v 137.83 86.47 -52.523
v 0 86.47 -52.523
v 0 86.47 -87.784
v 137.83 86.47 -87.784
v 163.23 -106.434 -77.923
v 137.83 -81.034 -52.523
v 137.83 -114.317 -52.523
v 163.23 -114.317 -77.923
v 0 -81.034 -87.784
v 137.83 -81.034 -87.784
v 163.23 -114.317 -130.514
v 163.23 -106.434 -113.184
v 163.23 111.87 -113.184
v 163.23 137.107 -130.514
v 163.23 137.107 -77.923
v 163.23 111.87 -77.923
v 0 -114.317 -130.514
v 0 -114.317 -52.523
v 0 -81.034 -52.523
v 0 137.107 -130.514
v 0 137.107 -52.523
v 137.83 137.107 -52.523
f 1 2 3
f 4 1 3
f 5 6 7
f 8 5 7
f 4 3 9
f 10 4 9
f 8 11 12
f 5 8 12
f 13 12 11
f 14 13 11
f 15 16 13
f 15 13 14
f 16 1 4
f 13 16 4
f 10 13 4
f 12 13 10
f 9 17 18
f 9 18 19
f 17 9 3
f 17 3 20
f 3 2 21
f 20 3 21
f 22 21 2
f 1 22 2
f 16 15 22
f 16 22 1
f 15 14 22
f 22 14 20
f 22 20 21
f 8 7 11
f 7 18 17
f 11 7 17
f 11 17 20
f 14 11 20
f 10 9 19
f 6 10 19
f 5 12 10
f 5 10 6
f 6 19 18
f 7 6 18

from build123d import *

# Parameters (mm, degrees)
F1_DEPTH = 163.230464
F2_SIZE  = 25.4


with BuildPart() as f1:
    # F0 (on Right) → F1 (new body)
    with BuildSketch(Plane.YZ):
        Polygon((-81.034228, -87.784111), (-81.034228, -52.52336), (-114.317387, -52.52336), (-114.317387, -130.513579), (137.106746, -130.513579), (137.106746, -52.52336), (86.470395, -52.52336), (86.470395, -87.784111), align=None)
    extrude(amount=F1_DEPTH)

    # F2
    f2_edges = [f1.edges().sort_by_distance(p)[0] for p in [
        (163.230464, 2.718084, -87.784111),
        (163.230464, -81.034228, -70.153736),
        (163.230464, 86.470395, -70.153736),
        (163.230464, 111.788571, -52.52336),
        (163.230464, -97.675808, -52.52336),
    ]]
    chamfer(f2_edges, length=F2_SIZE)


solid = f1.part
